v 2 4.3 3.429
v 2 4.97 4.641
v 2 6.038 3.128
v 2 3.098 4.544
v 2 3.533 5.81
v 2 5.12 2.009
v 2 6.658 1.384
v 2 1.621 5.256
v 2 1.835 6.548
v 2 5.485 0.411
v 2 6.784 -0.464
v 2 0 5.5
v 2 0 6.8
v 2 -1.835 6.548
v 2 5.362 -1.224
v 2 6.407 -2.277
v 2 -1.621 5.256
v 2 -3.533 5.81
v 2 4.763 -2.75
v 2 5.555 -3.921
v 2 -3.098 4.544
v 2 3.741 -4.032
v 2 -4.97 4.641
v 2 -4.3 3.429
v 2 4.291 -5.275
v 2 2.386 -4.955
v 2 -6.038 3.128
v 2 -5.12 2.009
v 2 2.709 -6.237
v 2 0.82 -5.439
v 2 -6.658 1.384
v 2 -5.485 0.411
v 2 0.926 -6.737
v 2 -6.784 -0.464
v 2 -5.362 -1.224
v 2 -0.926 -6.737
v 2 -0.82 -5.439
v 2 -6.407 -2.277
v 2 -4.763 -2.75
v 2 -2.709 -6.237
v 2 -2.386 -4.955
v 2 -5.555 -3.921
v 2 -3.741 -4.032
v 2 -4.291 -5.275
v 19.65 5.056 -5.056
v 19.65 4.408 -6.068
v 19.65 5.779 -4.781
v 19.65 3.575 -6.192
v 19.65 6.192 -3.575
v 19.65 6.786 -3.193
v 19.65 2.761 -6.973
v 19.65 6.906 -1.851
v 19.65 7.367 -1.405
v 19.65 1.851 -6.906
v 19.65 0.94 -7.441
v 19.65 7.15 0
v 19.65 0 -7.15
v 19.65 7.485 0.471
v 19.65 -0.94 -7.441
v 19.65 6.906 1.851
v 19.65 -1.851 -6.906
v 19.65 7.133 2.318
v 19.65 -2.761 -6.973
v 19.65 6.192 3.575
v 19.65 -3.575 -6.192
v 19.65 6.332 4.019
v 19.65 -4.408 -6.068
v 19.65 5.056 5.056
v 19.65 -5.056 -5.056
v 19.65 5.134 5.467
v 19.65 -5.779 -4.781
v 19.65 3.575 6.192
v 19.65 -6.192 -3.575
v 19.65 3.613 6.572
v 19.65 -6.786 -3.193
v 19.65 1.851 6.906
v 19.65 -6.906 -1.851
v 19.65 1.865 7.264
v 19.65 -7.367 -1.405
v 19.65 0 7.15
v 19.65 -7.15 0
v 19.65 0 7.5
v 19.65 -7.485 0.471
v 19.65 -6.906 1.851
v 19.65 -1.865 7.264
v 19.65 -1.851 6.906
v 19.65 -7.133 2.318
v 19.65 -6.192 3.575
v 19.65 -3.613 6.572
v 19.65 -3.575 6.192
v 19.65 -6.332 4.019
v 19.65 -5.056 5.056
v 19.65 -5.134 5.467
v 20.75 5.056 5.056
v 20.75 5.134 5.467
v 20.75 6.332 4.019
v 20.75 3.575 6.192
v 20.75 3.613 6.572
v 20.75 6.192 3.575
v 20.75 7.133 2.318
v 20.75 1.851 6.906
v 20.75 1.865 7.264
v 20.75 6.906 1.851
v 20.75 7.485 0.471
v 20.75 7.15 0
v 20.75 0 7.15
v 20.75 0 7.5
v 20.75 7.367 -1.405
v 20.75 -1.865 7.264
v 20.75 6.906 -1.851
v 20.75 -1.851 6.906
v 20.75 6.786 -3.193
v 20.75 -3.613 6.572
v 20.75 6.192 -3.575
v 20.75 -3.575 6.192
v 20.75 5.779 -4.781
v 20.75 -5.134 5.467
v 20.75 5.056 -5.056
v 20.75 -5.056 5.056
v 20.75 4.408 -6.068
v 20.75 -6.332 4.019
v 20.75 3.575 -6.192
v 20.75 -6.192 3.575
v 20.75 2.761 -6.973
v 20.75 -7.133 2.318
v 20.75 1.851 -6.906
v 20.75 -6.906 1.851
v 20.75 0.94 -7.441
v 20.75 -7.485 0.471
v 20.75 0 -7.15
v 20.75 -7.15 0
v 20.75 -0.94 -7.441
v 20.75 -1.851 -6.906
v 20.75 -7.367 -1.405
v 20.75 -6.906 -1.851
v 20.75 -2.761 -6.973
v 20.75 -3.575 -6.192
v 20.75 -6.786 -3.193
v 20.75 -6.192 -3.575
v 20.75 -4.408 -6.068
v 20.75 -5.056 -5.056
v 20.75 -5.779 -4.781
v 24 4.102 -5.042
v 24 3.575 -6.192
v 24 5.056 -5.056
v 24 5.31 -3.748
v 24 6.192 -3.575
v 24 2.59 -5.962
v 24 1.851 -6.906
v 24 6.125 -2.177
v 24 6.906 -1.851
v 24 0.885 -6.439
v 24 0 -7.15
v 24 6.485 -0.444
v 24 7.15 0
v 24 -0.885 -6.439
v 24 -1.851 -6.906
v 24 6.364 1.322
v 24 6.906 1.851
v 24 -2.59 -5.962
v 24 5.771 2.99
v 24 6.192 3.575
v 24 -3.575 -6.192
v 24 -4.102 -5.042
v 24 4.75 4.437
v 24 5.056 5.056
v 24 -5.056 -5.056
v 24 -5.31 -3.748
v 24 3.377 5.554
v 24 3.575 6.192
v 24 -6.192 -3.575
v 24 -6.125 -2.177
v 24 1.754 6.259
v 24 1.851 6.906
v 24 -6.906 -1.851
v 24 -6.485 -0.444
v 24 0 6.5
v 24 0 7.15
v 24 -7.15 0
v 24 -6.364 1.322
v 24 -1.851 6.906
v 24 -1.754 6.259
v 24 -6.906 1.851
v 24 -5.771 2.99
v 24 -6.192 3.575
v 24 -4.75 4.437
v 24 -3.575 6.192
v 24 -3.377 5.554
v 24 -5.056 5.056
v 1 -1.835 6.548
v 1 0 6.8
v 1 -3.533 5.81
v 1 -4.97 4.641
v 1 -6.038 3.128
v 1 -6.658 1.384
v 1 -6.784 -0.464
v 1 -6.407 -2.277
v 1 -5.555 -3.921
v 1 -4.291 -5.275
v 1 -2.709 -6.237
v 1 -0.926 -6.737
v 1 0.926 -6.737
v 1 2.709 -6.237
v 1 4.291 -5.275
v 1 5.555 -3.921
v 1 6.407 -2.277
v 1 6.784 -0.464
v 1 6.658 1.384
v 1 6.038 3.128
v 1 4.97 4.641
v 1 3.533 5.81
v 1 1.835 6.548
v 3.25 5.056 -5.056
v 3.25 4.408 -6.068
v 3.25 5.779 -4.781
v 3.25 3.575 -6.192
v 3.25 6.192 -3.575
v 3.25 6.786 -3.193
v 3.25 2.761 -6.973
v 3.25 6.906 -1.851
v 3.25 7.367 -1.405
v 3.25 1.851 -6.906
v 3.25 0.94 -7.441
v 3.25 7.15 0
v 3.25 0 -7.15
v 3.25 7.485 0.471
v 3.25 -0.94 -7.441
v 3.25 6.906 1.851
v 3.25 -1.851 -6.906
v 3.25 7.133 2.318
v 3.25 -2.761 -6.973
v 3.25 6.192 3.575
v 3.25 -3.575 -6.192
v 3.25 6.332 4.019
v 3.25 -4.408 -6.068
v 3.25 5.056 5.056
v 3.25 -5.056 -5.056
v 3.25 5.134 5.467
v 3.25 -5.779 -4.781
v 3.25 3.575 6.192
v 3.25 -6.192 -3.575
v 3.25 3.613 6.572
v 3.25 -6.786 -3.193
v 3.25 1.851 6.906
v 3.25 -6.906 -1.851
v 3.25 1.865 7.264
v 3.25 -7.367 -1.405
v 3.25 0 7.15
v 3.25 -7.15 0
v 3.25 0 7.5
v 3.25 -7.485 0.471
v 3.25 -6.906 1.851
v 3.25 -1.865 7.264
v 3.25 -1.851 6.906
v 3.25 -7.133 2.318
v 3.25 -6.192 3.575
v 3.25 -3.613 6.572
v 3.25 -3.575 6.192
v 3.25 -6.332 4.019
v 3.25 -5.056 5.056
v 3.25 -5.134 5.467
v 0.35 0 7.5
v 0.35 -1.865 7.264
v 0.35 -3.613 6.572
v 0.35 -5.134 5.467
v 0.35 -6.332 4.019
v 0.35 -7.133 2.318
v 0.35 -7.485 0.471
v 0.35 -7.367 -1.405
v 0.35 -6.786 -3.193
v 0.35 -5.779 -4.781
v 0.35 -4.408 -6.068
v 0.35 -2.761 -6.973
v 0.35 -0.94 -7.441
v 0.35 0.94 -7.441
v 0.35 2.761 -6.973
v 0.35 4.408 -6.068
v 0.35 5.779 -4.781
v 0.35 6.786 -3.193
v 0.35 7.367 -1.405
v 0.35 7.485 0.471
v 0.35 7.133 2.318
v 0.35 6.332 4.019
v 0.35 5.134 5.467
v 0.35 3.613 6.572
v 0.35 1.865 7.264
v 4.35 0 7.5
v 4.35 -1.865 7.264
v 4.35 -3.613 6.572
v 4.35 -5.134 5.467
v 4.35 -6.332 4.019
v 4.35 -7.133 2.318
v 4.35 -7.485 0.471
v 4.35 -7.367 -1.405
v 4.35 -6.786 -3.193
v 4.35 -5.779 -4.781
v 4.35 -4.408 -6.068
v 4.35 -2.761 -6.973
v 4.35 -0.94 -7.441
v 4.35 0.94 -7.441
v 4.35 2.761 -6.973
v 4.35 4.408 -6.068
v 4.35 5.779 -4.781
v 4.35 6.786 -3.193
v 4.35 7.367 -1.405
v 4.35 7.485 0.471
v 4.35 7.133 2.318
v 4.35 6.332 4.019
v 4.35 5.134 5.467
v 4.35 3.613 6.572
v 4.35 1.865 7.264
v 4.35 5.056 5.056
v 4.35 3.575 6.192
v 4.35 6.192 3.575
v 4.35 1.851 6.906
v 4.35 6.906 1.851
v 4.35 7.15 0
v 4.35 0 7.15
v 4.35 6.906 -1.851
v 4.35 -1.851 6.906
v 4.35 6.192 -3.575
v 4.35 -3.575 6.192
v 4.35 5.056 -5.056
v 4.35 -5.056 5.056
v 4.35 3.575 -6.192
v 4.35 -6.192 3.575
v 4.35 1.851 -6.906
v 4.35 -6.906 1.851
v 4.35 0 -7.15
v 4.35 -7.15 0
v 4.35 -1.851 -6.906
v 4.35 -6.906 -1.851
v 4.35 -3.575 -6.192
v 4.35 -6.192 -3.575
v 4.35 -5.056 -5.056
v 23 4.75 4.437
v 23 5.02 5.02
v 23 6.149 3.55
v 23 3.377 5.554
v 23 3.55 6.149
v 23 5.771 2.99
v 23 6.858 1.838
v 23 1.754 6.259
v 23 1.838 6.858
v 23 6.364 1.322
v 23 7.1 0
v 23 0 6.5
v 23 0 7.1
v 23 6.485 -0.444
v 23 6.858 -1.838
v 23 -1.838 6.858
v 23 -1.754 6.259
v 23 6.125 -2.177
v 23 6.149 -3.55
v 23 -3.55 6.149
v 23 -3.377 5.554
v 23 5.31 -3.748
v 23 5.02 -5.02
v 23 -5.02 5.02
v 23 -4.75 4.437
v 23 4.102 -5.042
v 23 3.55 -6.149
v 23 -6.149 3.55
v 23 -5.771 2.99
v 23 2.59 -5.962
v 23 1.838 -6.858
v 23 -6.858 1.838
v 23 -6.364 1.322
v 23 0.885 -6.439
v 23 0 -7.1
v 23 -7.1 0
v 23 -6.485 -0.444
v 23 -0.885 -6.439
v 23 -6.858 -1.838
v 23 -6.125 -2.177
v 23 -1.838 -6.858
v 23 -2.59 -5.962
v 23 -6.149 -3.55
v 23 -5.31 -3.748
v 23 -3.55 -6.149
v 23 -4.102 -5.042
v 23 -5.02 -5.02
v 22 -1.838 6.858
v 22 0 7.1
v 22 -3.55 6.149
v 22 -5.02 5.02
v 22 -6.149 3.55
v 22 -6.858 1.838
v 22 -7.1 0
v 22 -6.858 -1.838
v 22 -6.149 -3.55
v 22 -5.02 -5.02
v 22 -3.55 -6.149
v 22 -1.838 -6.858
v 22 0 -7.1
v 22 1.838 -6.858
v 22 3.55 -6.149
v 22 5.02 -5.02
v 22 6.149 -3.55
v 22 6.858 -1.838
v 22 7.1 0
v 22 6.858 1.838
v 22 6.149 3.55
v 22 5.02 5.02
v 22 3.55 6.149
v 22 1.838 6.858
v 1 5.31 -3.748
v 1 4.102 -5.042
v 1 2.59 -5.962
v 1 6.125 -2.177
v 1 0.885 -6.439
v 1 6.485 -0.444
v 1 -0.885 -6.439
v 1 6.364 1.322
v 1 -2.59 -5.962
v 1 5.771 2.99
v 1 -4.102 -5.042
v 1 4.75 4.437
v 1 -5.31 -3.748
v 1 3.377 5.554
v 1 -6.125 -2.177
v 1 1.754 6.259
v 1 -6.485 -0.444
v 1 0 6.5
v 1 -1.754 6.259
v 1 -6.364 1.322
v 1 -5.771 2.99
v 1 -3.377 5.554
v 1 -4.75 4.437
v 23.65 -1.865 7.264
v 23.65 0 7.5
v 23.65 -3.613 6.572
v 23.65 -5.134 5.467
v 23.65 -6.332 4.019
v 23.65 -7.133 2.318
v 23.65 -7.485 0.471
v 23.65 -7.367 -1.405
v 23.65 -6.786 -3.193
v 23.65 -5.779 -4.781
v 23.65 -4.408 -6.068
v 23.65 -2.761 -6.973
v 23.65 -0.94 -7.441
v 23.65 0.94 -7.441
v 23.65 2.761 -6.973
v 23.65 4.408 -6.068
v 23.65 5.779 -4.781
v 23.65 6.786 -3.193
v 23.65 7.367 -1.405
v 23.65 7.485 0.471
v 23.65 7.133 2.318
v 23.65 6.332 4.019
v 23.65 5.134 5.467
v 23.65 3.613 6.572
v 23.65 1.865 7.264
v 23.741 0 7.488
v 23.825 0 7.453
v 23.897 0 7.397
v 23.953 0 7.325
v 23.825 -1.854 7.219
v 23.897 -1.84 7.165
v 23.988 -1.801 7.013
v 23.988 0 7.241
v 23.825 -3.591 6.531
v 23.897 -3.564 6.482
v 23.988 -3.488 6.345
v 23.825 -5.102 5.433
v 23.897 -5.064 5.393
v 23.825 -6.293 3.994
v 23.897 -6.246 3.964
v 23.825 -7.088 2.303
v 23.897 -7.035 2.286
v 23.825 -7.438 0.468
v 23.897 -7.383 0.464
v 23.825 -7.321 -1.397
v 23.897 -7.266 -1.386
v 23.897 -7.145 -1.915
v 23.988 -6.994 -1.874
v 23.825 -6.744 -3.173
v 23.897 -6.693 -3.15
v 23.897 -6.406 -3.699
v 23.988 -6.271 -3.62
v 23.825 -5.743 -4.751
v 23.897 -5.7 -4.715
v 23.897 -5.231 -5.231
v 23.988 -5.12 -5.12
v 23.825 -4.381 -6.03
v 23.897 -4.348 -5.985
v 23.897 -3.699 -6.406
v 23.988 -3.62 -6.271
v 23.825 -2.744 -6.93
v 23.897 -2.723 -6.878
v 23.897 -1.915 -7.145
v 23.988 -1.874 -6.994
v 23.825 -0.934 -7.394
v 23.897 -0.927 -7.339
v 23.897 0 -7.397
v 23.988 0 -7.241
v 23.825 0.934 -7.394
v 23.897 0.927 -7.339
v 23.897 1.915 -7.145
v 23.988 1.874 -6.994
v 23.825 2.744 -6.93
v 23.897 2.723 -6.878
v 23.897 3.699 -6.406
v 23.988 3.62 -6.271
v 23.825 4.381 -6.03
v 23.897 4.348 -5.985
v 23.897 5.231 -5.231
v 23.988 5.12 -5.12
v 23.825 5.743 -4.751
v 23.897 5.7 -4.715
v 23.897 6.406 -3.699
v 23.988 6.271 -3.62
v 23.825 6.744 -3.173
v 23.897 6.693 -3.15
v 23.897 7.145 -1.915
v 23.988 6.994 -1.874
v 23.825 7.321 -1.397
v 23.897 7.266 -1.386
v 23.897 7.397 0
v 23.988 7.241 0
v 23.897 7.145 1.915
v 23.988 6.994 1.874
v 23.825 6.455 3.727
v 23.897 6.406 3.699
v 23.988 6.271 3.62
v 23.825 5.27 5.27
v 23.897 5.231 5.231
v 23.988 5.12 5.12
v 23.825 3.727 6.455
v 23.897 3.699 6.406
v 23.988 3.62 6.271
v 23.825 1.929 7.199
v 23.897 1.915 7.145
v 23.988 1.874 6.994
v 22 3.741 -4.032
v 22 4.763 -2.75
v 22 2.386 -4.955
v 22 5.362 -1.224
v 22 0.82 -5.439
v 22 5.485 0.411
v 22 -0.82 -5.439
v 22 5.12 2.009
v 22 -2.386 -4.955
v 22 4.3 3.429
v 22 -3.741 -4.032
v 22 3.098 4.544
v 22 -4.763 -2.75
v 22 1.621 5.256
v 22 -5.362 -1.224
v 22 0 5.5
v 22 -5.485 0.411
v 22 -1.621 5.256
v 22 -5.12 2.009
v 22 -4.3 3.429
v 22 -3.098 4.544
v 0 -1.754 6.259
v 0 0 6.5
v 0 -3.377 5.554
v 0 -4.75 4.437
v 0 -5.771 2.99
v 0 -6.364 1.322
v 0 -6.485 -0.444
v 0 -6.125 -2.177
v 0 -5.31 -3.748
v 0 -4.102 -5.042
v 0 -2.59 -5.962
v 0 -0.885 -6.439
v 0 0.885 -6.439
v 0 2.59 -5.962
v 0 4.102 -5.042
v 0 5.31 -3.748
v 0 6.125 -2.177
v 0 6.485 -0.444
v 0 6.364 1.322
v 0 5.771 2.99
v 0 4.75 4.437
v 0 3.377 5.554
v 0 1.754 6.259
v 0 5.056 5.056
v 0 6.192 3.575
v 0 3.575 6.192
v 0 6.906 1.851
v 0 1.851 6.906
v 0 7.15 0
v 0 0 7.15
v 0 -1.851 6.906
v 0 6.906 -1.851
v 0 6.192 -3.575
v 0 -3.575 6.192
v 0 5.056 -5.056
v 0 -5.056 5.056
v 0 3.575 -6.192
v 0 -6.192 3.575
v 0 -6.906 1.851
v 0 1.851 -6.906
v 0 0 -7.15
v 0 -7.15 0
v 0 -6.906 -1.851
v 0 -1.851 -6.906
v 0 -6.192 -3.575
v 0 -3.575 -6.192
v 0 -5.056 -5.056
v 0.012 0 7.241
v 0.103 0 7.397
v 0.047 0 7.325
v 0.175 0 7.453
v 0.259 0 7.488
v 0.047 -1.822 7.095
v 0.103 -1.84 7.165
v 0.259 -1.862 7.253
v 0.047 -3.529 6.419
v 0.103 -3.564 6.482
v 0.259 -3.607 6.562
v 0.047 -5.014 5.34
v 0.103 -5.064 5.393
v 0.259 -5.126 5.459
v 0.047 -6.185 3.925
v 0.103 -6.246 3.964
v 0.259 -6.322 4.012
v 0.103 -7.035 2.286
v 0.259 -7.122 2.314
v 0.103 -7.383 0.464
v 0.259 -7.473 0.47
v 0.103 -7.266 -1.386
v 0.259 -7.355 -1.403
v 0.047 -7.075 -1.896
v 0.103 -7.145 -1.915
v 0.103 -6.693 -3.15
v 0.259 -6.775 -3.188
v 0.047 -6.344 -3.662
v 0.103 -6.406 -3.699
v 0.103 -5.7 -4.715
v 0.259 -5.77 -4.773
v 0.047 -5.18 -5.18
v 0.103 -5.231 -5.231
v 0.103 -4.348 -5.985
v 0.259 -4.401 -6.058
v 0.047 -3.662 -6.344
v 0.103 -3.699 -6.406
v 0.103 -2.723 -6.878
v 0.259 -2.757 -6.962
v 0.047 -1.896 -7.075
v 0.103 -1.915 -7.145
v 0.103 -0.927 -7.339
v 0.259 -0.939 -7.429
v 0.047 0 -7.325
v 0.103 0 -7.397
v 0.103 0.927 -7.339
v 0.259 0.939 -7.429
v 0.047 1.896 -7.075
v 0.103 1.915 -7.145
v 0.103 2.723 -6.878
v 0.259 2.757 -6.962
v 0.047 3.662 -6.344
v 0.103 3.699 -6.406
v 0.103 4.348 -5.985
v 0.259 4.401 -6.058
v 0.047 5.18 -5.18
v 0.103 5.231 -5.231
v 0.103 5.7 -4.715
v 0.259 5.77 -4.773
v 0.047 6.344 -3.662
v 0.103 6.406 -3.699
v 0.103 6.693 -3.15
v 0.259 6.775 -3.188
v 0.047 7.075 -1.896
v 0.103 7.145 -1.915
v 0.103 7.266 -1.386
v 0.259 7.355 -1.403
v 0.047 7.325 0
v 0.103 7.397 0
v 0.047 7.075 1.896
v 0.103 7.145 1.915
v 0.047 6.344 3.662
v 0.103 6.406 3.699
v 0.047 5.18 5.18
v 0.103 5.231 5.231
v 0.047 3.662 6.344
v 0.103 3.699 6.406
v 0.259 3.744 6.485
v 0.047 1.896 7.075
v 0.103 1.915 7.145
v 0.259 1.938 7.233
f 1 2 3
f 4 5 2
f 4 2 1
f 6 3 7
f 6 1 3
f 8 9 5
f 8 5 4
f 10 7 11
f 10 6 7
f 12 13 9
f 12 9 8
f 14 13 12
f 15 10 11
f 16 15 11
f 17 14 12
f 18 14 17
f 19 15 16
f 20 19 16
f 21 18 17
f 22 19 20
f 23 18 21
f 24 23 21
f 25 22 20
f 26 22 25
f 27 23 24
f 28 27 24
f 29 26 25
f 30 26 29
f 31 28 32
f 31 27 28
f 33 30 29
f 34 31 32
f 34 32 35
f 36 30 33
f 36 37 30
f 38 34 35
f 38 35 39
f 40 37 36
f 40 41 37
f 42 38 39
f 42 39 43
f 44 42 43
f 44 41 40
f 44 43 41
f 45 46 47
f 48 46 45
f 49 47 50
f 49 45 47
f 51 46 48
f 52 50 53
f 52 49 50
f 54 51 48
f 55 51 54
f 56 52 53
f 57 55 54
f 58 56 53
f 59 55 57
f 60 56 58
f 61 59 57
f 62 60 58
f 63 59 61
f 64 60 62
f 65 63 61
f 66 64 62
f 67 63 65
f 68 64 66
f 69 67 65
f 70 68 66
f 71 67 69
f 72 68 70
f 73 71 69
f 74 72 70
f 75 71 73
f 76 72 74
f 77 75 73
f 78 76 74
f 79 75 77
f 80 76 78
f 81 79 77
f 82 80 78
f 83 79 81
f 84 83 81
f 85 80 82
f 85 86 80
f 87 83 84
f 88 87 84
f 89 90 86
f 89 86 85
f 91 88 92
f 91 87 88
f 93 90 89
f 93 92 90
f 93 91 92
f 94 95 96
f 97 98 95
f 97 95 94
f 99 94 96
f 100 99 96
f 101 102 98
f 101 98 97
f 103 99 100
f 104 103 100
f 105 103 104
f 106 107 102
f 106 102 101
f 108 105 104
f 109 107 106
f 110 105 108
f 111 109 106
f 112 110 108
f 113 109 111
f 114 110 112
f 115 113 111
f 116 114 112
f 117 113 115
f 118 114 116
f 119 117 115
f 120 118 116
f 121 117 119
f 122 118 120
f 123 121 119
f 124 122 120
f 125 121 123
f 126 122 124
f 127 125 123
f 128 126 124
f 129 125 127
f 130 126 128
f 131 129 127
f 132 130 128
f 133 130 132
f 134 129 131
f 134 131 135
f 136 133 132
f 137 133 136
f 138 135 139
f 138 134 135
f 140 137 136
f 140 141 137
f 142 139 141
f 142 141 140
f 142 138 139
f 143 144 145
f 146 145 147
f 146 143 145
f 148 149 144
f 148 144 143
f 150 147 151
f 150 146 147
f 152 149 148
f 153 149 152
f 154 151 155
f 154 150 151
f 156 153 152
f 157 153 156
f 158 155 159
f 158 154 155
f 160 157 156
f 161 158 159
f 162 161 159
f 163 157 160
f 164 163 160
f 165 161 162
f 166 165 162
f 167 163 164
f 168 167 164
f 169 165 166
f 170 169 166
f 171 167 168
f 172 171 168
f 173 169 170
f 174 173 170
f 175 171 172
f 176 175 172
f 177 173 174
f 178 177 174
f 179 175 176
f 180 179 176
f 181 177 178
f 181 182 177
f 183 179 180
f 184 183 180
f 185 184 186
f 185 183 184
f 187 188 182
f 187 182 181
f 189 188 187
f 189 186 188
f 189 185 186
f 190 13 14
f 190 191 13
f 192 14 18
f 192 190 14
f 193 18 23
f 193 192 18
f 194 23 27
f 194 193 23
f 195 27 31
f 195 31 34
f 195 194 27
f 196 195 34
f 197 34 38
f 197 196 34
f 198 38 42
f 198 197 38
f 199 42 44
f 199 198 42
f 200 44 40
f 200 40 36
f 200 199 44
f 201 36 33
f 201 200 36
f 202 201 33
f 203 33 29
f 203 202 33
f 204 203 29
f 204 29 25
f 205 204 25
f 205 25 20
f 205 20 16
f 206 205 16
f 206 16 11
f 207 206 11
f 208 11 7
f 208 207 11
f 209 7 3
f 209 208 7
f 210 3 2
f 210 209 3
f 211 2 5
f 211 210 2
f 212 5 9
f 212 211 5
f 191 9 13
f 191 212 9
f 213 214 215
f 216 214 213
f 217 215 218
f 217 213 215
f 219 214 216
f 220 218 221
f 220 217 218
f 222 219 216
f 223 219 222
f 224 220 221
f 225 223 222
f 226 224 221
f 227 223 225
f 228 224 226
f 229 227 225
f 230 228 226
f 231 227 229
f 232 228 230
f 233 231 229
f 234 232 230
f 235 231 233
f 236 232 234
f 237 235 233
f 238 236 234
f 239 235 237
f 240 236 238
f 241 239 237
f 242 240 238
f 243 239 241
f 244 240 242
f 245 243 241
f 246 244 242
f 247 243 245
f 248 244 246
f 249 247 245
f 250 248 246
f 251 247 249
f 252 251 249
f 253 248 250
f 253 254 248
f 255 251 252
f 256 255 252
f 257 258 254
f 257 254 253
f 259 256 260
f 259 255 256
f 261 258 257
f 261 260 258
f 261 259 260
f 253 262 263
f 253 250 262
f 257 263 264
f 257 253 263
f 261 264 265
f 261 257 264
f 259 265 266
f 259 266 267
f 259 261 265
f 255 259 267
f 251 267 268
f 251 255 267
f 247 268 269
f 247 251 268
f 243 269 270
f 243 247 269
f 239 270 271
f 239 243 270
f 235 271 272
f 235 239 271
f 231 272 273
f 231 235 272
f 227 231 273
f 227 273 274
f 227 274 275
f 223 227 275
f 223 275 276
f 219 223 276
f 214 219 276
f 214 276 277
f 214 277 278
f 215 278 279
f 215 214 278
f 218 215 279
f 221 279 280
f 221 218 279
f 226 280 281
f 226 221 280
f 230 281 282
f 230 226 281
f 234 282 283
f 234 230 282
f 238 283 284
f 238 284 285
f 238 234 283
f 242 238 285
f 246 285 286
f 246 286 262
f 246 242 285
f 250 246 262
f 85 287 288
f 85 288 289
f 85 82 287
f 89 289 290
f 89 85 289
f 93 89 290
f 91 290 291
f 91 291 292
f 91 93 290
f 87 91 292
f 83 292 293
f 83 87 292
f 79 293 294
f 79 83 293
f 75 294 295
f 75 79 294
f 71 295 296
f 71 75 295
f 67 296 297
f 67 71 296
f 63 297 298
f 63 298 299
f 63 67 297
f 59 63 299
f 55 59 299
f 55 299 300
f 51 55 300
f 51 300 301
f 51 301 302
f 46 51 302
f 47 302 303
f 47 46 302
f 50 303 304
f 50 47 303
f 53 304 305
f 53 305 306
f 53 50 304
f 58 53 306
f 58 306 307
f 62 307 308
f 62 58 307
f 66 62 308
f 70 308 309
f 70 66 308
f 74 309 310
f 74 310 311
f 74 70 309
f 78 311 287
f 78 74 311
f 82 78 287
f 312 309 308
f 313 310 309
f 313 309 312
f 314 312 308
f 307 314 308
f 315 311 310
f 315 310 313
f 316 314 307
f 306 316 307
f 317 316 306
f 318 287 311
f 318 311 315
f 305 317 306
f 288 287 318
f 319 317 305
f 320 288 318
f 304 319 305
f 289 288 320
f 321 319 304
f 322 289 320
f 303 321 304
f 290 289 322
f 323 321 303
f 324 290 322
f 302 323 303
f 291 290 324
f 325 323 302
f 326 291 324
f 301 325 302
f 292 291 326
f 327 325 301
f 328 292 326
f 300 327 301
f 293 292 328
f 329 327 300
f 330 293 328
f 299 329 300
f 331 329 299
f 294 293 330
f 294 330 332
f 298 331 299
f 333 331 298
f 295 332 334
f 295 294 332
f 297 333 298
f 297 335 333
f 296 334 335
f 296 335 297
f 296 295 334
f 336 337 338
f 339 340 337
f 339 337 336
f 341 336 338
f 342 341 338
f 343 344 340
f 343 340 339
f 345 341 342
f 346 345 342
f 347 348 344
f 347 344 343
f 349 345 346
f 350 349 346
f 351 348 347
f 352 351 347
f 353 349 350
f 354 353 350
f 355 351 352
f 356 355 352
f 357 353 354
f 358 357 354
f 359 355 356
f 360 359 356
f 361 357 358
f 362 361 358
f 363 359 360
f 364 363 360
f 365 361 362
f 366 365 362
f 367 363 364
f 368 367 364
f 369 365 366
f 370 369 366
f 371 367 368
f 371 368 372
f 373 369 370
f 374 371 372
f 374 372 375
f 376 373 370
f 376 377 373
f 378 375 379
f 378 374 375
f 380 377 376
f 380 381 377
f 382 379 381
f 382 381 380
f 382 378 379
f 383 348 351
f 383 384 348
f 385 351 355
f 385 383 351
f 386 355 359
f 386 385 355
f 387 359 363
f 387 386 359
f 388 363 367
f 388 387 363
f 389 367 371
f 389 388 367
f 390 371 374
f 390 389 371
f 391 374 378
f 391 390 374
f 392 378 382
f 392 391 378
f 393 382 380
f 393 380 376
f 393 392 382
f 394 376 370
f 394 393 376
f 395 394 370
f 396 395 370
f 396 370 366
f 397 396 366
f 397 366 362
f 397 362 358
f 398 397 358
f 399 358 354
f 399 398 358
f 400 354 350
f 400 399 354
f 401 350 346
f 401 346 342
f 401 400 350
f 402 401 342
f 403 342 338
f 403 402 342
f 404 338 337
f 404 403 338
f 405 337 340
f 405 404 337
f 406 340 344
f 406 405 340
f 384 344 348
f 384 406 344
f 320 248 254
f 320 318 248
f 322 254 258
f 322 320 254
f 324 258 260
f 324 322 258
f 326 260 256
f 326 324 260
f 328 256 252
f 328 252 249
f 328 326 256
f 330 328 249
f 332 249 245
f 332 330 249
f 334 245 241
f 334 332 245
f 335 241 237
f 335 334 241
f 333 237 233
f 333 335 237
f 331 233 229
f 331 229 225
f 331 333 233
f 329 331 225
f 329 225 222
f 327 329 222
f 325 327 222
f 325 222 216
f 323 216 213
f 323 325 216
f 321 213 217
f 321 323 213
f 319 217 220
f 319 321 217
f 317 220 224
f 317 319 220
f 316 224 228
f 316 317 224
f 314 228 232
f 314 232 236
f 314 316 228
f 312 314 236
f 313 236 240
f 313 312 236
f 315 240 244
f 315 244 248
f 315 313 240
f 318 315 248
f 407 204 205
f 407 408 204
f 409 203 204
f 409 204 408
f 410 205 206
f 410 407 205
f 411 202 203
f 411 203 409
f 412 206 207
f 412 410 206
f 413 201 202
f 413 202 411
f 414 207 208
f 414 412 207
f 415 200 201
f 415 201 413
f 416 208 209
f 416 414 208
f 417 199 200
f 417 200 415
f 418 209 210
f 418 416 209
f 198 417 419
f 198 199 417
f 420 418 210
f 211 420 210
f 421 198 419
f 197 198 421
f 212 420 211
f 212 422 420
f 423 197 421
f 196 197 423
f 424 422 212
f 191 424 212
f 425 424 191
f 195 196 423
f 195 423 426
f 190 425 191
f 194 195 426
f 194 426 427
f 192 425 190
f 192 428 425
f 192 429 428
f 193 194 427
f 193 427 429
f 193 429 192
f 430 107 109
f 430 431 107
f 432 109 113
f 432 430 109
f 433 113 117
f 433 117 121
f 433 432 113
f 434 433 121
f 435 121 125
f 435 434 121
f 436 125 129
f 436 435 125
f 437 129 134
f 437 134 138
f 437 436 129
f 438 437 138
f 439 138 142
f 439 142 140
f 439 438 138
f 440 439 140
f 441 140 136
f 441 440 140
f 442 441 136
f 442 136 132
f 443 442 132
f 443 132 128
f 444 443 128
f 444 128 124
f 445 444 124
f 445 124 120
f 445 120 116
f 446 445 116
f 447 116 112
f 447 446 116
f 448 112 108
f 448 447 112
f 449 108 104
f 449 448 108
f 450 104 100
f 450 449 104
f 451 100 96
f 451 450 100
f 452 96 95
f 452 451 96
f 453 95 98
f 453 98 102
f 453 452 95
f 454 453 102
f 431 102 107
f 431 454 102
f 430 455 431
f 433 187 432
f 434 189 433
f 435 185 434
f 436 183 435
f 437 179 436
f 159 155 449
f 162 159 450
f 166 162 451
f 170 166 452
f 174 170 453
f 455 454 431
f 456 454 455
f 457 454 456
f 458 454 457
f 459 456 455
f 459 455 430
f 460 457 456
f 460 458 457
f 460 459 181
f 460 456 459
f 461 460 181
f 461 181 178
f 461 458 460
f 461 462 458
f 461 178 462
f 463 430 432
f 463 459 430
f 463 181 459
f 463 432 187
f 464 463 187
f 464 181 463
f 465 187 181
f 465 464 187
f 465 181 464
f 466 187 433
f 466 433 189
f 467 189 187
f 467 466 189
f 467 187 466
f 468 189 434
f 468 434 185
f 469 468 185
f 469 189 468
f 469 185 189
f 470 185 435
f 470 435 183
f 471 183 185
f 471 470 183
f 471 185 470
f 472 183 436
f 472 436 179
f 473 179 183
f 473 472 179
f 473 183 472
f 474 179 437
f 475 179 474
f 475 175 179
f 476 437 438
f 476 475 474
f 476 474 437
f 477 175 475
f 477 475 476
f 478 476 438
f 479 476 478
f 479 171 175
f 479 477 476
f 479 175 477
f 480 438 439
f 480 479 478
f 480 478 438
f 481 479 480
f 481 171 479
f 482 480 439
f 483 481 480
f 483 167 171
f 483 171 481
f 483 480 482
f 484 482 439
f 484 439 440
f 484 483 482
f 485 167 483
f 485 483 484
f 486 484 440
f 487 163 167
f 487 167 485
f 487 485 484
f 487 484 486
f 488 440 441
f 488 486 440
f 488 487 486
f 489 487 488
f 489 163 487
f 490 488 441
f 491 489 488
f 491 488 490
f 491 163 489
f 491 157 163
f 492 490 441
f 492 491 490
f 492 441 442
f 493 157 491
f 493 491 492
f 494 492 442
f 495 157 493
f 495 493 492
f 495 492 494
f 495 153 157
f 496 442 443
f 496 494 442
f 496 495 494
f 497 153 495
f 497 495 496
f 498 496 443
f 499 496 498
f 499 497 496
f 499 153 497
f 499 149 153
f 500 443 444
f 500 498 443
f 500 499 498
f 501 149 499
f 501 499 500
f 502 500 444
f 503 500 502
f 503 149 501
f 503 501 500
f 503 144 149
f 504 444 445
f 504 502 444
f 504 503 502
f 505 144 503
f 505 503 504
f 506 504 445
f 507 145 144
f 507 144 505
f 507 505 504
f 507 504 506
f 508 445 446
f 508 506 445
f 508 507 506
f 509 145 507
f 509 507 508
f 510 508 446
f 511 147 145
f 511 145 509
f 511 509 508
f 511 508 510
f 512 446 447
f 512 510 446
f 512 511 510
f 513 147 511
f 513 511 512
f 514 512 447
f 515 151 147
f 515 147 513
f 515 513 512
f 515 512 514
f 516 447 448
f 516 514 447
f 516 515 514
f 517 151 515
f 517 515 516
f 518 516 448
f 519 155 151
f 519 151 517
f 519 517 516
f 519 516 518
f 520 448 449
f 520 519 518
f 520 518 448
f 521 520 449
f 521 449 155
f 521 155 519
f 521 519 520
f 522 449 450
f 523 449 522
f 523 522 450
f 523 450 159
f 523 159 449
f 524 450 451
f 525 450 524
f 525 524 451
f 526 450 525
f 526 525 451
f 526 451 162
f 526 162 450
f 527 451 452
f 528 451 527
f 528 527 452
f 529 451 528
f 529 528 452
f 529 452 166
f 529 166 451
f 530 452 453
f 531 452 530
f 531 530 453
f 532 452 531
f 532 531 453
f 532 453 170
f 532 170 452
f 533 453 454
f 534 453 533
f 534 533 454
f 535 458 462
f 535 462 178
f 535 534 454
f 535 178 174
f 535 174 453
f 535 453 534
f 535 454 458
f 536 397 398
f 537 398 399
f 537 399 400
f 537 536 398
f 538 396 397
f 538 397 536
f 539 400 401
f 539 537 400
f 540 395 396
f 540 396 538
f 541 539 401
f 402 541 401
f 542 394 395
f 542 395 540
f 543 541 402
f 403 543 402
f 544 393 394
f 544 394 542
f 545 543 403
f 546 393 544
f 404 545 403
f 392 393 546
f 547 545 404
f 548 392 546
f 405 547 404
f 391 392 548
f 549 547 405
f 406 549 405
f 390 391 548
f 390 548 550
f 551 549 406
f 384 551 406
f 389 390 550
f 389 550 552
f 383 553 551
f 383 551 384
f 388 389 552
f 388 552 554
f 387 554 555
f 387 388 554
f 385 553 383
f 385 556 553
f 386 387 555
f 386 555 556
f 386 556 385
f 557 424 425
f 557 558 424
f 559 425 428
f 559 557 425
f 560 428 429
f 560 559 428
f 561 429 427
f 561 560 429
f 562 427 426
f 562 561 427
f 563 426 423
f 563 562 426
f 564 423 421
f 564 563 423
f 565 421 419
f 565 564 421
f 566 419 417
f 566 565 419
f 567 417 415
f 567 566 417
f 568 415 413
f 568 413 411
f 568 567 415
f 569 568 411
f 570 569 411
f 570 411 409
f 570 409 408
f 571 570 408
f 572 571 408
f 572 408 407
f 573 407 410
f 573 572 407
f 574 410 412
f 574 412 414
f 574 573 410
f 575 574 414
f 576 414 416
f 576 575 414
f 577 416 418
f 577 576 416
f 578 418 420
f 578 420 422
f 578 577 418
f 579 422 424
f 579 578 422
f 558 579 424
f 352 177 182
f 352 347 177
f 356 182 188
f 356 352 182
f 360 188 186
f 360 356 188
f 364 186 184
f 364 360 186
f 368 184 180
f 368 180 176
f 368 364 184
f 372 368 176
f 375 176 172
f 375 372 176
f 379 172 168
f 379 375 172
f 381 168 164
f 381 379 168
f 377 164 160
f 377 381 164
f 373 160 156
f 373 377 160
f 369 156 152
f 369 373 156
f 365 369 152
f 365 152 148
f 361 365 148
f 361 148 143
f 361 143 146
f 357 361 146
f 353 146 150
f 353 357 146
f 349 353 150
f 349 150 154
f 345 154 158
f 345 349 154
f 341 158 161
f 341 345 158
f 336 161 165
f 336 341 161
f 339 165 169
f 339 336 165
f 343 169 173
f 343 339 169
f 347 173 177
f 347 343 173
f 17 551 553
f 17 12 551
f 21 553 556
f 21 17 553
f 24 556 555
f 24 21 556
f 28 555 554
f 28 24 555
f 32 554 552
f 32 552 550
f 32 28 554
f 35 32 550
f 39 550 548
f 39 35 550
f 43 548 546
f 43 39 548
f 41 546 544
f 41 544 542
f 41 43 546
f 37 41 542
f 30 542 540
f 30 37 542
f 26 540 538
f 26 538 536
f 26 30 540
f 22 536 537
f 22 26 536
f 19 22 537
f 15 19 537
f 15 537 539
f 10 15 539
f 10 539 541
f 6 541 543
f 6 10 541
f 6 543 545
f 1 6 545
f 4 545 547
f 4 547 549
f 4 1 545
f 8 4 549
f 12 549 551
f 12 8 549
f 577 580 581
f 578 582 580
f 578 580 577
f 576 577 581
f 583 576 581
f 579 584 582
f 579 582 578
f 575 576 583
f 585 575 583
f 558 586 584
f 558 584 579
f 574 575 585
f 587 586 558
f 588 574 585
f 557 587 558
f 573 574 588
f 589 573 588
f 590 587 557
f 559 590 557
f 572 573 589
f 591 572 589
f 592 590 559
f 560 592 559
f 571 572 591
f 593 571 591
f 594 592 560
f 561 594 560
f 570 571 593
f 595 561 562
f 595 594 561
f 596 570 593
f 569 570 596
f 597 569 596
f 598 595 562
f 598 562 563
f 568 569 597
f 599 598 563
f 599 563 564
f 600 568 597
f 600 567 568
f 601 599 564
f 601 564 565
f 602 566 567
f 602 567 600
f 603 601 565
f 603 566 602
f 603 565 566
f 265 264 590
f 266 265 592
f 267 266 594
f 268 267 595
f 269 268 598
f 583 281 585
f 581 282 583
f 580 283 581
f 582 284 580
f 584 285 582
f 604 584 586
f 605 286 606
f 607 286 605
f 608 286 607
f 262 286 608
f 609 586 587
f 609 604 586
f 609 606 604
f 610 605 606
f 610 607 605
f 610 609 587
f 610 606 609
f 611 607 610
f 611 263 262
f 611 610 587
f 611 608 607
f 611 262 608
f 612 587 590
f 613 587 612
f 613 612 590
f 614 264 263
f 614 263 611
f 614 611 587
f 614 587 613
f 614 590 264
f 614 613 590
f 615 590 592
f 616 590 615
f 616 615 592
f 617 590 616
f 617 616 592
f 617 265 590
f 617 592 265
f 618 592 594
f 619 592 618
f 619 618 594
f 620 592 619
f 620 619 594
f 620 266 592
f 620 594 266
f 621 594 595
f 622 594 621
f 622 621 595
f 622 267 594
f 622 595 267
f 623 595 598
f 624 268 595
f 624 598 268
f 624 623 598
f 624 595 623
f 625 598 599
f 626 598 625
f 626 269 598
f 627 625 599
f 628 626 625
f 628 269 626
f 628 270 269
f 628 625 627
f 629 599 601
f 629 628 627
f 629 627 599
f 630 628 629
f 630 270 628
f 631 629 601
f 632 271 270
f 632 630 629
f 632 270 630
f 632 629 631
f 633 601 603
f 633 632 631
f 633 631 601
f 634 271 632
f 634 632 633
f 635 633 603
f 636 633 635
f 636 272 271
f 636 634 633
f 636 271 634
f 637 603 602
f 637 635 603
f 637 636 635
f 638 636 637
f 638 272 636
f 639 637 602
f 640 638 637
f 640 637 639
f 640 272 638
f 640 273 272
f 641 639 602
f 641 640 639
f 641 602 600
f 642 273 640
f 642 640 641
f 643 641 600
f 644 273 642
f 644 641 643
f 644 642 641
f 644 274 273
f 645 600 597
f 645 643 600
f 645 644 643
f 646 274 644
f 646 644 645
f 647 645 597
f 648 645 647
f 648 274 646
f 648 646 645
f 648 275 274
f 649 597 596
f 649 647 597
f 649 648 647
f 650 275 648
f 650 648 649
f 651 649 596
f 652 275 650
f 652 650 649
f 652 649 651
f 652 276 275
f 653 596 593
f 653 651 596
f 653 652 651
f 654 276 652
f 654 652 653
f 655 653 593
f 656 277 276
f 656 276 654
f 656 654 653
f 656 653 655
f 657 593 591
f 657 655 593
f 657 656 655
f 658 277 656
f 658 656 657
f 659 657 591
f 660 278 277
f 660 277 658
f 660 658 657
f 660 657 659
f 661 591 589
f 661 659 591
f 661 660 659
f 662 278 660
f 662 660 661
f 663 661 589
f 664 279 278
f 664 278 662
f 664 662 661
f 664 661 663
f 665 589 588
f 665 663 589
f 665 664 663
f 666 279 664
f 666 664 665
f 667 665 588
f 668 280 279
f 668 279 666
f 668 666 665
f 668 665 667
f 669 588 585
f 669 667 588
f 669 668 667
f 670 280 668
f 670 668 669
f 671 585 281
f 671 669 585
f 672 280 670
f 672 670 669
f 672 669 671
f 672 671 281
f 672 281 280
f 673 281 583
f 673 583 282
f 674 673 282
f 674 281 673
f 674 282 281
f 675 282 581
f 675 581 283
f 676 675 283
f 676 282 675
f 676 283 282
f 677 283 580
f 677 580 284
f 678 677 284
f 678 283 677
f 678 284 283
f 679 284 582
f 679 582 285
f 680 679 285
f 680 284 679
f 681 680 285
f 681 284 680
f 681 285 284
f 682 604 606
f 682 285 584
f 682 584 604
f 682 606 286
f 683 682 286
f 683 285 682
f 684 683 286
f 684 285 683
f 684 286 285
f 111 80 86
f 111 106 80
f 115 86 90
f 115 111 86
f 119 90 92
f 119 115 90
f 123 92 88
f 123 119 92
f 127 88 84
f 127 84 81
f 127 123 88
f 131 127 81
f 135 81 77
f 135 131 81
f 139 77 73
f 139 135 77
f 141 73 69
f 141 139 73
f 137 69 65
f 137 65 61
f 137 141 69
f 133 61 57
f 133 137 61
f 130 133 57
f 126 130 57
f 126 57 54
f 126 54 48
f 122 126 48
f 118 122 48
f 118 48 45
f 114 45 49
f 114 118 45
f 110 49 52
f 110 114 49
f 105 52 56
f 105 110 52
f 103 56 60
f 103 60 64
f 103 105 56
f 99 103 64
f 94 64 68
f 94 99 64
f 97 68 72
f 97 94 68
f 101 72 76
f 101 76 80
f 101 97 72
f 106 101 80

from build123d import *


with BuildPart() as part:
    # Croquis1 → Revolución1 (revolve)
    with BuildSketch(Plane.XY, mode=Mode.PRIVATE) as revoluci_n1_sk:
        with BuildLine():
            Line((24, 7.15), (24, 6.5))
            Line((24, 6.5), (23, 6.5))
            Line((23, 6.5), (23, 7.1))
            Line((23, 7.1), (22, 7.1))
            Line((22, 7.1), (22, 5.5))
            Line((22, 5.5), (2, 5.5))
            Line((2, 5.5), (2, 6.8))
            Line((2, 6.8), (1, 6.8))
            Line((1, 6.8), (1, 6.5))
            Line((1, 6.5), (0, 6.5))
            Line((0, 6.5), (0, 7.15))
            ThreePointArc((0, 7.15), (0.102512627, 7.397487373), (0.35, 7.5))
            Line((0.35, 7.5), (3.25, 7.5))
            Line((3.25, 7.5), (3.25, 7.15))
            Line((3.25, 7.15), (4.35, 7.15))
            Line((4.35, 7.15), (4.35, 7.5))
            Line((4.35, 7.5), (19.65, 7.5))
            Line((19.65, 7.5), (19.65, 7.15))
            Line((19.65, 7.15), (20.75, 7.15))
            Line((20.75, 7.15), (20.75, 7.5))
            Line((20.75, 7.5), (23.65, 7.5))
            ThreePointArc((23.65, 7.5), (23.897487373, 7.397487373), (24, 7.15))
        make_face()
    revolve(revoluci_n1_sk.sketch.rotate(Axis((0, 0, 0), (1, 0, 0)), 90), axis=Axis((0, 0, 0), (1, 0, 0)))


solid = part.part
